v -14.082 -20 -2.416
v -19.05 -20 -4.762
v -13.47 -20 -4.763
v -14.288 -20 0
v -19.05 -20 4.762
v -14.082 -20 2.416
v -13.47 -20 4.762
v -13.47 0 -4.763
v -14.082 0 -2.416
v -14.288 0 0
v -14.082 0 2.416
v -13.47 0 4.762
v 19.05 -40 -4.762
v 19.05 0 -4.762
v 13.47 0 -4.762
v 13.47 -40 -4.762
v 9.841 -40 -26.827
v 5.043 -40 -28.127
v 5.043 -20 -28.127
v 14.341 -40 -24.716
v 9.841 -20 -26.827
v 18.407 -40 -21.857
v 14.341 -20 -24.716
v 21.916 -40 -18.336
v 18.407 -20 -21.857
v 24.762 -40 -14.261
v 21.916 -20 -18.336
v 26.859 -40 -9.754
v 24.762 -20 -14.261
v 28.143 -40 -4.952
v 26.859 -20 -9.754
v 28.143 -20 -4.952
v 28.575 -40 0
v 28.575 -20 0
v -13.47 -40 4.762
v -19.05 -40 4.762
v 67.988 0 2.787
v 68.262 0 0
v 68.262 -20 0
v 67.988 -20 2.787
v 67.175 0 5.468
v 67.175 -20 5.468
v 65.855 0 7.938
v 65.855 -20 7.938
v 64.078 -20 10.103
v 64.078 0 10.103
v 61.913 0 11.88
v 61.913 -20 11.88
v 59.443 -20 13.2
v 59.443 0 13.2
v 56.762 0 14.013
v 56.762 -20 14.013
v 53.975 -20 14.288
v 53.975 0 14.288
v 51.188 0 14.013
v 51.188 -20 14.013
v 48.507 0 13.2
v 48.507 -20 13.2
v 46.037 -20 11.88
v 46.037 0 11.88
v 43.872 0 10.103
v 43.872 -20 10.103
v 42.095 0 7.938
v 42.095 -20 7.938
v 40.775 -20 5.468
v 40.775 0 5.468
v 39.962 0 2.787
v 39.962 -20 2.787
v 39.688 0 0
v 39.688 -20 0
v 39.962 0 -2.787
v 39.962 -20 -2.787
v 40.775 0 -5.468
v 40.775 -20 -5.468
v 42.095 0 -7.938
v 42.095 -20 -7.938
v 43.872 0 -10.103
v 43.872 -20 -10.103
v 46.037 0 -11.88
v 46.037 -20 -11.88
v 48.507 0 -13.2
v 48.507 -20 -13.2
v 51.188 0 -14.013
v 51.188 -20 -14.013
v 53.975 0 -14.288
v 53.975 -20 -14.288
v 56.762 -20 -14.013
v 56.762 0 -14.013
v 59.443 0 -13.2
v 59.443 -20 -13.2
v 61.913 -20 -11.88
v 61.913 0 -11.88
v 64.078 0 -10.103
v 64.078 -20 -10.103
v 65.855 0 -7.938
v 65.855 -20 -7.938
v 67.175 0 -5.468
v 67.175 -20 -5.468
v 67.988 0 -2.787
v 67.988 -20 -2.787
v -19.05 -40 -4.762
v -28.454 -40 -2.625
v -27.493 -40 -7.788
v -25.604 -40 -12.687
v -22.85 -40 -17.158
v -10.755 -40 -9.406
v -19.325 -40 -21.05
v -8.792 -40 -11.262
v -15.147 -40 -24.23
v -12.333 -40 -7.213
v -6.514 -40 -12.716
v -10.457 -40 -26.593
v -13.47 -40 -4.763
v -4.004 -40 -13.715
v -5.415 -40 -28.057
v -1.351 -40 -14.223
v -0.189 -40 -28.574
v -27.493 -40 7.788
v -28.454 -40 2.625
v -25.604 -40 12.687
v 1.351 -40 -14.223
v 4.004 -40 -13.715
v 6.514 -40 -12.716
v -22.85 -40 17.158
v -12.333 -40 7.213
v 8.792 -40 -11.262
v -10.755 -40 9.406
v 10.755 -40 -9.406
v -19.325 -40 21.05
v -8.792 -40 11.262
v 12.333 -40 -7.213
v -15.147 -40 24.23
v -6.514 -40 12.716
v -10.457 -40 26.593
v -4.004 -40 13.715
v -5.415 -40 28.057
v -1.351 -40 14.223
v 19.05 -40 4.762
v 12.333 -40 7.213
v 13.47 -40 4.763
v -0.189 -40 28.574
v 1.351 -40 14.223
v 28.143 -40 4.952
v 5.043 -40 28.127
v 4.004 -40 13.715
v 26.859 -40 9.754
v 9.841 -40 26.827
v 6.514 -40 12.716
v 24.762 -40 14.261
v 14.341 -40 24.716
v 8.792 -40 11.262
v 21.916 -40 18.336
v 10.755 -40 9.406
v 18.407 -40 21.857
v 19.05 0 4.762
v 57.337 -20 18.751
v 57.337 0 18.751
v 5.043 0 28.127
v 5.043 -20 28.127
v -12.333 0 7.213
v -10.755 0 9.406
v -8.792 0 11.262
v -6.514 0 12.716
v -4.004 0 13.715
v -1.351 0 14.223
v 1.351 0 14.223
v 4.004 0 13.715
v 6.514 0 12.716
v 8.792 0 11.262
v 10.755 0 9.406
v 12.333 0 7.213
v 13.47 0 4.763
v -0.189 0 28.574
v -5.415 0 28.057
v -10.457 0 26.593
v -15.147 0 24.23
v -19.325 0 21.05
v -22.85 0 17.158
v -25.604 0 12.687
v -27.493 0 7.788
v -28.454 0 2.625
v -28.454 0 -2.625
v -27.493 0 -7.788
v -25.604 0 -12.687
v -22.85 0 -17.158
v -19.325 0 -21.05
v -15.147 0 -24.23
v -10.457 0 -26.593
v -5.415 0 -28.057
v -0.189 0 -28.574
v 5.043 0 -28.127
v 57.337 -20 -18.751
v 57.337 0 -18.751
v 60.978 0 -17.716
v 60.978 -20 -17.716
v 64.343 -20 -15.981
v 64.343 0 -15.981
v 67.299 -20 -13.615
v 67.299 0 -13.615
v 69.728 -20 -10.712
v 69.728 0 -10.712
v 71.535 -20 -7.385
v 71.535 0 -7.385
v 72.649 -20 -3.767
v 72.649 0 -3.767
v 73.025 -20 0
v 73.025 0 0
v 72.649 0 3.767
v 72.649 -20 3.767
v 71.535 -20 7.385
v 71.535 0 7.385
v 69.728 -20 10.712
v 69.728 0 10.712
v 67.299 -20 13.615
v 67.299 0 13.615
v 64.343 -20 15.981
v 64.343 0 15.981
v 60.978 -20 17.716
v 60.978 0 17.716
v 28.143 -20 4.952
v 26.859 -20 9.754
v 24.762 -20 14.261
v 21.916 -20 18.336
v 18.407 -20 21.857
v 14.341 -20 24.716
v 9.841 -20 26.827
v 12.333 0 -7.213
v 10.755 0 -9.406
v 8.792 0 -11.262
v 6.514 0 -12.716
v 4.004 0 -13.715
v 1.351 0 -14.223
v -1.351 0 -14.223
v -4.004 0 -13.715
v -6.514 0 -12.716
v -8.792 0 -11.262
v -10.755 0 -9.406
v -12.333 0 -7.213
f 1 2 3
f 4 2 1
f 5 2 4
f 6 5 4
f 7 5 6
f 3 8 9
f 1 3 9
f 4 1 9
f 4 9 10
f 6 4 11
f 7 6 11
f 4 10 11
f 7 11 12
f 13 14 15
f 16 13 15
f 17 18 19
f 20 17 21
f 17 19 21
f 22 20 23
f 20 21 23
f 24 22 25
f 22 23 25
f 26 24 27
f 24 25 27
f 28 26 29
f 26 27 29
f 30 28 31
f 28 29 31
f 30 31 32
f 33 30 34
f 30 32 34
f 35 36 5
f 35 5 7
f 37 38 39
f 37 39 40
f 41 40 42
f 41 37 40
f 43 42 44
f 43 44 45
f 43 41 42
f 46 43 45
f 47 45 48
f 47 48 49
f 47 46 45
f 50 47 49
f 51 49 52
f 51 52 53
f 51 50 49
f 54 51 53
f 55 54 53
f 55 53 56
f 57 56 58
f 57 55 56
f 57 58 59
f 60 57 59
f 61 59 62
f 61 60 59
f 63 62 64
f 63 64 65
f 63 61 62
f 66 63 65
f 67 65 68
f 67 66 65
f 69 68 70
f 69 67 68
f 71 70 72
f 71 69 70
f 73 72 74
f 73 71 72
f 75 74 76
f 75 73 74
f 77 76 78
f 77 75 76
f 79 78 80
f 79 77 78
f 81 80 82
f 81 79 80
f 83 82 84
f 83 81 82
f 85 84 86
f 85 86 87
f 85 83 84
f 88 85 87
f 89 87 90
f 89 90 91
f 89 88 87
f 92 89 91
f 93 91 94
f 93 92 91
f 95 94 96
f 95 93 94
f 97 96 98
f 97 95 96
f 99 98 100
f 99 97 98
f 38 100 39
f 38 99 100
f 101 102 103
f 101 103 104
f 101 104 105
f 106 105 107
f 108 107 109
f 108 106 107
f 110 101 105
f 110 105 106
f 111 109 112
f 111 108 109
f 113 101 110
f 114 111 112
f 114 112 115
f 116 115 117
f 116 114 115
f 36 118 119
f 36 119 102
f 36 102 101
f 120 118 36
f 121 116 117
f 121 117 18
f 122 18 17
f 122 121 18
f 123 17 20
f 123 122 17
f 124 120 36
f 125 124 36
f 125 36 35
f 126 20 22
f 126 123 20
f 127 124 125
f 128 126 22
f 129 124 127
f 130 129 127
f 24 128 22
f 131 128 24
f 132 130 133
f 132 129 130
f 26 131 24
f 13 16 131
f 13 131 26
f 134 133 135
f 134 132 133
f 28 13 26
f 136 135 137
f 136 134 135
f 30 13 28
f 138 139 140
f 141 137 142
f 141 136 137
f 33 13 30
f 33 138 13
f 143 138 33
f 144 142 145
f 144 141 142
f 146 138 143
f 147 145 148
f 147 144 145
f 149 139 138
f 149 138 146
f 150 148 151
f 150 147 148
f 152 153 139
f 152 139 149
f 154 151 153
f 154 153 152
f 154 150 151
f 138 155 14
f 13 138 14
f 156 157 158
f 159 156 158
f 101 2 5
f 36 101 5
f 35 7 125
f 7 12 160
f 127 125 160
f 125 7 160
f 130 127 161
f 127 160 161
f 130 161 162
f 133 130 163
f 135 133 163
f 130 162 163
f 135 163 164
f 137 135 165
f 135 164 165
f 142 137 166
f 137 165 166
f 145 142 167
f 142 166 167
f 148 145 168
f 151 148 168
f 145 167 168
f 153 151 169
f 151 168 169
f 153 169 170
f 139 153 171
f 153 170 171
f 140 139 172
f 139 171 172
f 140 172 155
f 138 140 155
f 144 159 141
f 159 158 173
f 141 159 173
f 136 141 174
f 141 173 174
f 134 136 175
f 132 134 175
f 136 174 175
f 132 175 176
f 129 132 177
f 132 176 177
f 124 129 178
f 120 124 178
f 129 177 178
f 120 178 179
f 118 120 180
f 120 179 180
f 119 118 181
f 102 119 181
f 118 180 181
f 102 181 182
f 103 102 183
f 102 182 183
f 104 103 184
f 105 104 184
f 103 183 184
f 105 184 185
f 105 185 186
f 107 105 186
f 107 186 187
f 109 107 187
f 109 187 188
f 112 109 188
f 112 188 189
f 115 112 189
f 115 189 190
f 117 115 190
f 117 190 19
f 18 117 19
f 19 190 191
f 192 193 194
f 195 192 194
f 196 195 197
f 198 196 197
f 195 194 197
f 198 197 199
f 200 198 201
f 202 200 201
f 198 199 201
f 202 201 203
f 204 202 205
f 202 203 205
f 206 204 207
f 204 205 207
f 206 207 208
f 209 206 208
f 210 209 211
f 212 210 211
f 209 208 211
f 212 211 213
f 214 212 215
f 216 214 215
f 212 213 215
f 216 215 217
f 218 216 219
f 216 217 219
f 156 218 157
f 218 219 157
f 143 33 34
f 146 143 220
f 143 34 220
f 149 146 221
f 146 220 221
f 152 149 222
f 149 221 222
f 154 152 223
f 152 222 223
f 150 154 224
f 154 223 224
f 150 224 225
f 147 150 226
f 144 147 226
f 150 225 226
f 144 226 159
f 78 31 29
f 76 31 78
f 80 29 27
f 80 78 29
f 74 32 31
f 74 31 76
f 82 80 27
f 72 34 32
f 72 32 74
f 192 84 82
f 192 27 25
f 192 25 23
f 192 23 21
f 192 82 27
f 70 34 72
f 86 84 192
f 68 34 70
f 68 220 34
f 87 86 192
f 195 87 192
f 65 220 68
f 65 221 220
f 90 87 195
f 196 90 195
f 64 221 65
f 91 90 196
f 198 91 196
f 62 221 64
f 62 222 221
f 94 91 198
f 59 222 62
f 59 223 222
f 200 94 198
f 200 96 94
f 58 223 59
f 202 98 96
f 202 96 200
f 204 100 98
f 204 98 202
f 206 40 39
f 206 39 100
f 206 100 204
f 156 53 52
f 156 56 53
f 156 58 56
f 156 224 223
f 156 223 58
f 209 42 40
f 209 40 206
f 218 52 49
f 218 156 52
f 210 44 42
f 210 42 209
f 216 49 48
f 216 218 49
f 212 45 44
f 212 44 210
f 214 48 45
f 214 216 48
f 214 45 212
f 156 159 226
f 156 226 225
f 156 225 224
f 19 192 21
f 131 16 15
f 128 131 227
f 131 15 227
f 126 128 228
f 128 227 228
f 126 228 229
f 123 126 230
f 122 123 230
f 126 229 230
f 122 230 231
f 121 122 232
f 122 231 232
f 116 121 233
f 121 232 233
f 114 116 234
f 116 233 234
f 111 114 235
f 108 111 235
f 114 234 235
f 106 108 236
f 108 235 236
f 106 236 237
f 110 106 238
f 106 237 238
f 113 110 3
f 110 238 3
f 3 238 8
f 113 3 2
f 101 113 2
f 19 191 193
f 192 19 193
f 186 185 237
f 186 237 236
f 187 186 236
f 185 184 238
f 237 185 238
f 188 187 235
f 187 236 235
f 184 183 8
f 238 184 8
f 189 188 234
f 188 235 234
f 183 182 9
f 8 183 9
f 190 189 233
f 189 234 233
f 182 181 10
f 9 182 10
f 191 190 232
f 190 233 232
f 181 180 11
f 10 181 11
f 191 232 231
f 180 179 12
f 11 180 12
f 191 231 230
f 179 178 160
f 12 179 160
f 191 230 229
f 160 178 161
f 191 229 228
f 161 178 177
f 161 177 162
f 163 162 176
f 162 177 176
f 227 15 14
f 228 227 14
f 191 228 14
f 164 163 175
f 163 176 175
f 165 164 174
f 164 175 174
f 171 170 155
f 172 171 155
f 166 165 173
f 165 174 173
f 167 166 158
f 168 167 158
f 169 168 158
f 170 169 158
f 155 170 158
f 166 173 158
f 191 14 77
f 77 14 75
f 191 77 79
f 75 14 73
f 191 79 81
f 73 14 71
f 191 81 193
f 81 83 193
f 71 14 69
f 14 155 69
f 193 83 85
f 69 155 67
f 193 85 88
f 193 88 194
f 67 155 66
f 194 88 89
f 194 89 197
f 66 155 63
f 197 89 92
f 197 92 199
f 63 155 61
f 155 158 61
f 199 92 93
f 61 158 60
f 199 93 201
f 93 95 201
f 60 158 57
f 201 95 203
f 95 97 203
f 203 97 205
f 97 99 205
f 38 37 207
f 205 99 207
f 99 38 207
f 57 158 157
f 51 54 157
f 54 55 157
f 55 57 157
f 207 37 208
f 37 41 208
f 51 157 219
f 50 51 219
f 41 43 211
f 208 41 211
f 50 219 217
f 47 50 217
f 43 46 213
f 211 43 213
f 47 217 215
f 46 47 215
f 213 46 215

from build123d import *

# Parameters (mm, degrees)
F0_R     = 14.2875
F1_DEPTH = 20
F2_DEPTH = 40


with BuildPart() as f1:
    # F0 (on Front) → F1 (new body)
    with BuildSketch(Plane.XZ):
        with BuildLine():
            ThreePointArc((5.042647, 28.126541), (21.916025, 18.336262), (28.575, 0))
            ThreePointArc((28.575, 0), (21.916025, -18.336262), (5.042647, -28.126541))
            Line((5.042647, -28.126541), (57.336765, -18.751028))
            ThreePointArc((57.336765, -18.751028), (34.925, 0), (57.336765, 18.751028))
            Line((57.336765, 18.751028), (5.042647, 28.126541))
        make_face()
        with BuildLine():
            ThreePointArc((73.025, 0), (68.585683, 12.224174), (57.336765, 18.751028))
            ThreePointArc((57.336765, 18.751028), (34.925, 0), (57.336765, -18.751028))
            ThreePointArc((57.336765, -18.751028), (68.585683, -12.224174), (73.025, 0))
        make_face()
        with Locations((53.975, 0)):
            Circle(F0_R, mode=Mode.SUBTRACT)
        with BuildLine():
            ThreePointArc((5.042647, -28.126541), (21.916025, -18.336262), (28.575, 0))
            ThreePointArc((28.575, 0), (21.916025, 18.336262), (5.042647, 28.126541))
            ThreePointArc((5.042647, 28.126541), (-28.575, 0), (5.042647, -28.126541))
        make_face()
        with BuildLine():
            ThreePointArc((-13.470384, 4.7625), (0, 14.2875), (13.470384, 4.7625))
            Line((13.470384, 4.7625), (19.05, 4.7625))
            Line((19.05, 4.7625), (19.05, -4.7625))
            Line((19.05, -4.7625), (13.470384, -4.7625))
            ThreePointArc((13.470384, -4.7625), (0, -14.2875), (-13.470384, -4.7625))
            Line((-13.470384, -4.7625), (-19.05, -4.7625))
            Line((-19.05, -4.7625), (-19.05, 4.7625))
            Line((-19.05, 4.7625), (-13.470384, 4.7625))
        make_face(mode=Mode.SUBTRACT)
        with BuildLine():
            ThreePointArc((-13.470384, -4.7625), (-14.2875, 0), (-13.470384, 4.7625))
            Line((-13.470384, 4.7625), (-19.05, 4.7625))
            Line((-19.05, 4.7625), (-19.05, -4.7625))
            Line((-19.05, -4.7625), (-13.470384, -4.7625))
        make_face()
    extrude(amount=F1_DEPTH)

    # F0 (on Front) → F2 (join)
    with BuildSketch(Plane.XZ):
        with BuildLine():
            ThreePointArc((5.042647, -28.126541), (21.916025, -18.336262), (28.575, 0))
            ThreePointArc((28.575, 0), (21.916025, 18.336262), (5.042647, 28.126541))
            ThreePointArc((5.042647, 28.126541), (-28.575, 0), (5.042647, -28.126541))
        make_face()
        with BuildLine():
            ThreePointArc((-13.470384, 4.7625), (0, 14.2875), (13.470384, 4.7625))
            Line((13.470384, 4.7625), (19.05, 4.7625))
            Line((19.05, 4.7625), (19.05, -4.7625))
            Line((19.05, -4.7625), (13.470384, -4.7625))
            ThreePointArc((13.470384, -4.7625), (0, -14.2875), (-13.470384, -4.7625))
            Line((-13.470384, -4.7625), (-19.05, -4.7625))
            Line((-19.05, -4.7625), (-19.05, 4.7625))
            Line((-19.05, 4.7625), (-13.470384, 4.7625))
        make_face(mode=Mode.SUBTRACT)
    extrude(amount=F2_DEPTH)


solid = f1.part
